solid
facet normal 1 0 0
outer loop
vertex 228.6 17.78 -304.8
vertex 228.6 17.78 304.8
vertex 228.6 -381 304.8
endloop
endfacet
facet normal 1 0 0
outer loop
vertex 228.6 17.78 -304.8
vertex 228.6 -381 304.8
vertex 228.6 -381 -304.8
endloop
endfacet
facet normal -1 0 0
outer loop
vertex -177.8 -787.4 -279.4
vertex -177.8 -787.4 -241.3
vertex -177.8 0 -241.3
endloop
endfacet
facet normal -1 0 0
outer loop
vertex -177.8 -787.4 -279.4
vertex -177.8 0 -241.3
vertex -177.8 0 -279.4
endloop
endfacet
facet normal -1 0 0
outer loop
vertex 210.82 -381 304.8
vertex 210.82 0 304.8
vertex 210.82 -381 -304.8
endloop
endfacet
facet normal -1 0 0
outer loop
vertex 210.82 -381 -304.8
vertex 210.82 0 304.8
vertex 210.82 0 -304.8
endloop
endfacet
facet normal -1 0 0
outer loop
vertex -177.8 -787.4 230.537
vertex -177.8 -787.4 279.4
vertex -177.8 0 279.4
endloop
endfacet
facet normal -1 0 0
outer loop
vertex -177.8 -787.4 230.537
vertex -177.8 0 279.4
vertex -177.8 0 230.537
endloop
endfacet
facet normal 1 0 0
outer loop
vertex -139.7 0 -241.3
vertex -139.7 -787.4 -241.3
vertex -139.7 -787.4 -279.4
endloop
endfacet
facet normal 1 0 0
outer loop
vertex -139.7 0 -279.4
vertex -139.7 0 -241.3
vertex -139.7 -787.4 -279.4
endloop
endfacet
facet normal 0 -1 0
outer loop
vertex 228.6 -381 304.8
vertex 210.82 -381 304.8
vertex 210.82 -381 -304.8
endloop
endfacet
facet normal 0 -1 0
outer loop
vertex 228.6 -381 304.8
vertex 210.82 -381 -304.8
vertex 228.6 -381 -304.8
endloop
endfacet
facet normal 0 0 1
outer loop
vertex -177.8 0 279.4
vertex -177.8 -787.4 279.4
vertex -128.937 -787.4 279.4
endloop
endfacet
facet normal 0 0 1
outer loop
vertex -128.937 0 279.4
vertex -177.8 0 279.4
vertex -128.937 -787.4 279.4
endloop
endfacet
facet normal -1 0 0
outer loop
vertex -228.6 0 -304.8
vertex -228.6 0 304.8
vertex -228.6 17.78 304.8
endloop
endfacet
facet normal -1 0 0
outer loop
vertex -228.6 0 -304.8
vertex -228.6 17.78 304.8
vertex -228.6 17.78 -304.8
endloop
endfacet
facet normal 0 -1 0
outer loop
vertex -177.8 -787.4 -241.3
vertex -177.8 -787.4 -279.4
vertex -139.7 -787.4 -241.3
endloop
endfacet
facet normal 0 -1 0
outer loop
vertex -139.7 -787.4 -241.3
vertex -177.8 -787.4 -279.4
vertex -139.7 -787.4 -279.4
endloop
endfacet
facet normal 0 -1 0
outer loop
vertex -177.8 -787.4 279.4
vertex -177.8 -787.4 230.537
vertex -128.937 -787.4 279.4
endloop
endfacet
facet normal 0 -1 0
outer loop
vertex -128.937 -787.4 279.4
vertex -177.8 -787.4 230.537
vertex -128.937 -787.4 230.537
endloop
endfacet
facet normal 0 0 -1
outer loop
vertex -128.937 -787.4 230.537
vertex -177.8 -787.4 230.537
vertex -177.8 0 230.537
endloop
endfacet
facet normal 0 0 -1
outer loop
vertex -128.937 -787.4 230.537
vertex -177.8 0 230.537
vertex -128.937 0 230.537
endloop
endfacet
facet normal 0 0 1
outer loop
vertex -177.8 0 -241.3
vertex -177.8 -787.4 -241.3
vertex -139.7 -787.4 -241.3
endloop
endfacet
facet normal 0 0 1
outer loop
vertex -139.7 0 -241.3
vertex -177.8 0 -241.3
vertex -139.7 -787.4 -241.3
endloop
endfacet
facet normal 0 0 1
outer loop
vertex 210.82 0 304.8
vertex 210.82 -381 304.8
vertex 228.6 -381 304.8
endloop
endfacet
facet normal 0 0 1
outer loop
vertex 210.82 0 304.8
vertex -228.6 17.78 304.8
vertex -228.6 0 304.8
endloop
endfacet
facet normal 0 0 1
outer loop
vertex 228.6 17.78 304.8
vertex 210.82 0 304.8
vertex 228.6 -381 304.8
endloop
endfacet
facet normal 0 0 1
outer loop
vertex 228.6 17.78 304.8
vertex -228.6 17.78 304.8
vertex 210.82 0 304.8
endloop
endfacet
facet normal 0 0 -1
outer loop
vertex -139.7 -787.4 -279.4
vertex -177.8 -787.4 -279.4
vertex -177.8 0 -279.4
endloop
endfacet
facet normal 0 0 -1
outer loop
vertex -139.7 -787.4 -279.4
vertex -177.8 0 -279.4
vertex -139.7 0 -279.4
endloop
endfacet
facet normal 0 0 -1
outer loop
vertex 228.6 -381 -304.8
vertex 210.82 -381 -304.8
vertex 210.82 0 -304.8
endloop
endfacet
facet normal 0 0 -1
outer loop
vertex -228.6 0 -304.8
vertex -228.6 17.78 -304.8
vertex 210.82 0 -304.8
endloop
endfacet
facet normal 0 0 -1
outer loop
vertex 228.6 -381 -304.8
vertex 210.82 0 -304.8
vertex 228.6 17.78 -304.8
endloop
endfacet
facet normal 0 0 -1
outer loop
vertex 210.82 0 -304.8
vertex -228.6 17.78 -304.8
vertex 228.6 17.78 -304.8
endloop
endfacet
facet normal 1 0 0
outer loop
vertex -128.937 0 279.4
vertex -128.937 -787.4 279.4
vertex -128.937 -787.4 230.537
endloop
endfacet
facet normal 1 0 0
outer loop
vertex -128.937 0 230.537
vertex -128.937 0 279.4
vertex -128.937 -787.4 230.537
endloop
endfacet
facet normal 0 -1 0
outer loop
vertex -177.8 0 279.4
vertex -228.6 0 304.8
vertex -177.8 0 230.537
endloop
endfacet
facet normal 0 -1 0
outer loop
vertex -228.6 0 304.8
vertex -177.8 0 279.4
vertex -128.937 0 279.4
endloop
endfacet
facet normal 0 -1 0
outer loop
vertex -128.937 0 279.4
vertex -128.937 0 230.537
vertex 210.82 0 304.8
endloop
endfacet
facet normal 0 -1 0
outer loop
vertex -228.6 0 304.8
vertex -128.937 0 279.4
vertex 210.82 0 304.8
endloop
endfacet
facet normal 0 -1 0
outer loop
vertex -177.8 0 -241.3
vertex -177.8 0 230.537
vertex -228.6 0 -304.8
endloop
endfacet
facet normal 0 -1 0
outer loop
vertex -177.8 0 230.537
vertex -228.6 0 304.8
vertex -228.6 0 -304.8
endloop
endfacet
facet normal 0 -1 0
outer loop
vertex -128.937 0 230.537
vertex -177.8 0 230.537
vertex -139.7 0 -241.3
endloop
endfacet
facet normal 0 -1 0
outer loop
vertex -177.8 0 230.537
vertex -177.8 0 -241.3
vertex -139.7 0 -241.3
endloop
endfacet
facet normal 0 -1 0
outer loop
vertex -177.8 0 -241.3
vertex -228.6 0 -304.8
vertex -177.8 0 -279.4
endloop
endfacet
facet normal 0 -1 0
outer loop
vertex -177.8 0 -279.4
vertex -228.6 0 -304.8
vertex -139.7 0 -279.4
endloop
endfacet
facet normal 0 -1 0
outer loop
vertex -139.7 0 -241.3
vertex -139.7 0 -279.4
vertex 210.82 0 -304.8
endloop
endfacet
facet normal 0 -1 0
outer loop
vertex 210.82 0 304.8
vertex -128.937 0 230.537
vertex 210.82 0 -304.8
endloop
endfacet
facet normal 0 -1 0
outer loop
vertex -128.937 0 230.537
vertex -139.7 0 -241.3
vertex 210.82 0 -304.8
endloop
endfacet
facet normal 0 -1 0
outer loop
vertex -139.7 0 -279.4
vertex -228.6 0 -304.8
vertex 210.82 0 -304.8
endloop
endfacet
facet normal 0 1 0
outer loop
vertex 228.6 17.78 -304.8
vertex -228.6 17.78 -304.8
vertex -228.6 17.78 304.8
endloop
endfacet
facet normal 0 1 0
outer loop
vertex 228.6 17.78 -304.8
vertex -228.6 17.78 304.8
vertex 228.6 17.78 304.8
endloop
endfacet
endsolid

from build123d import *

# Parameters (mm, degrees)
SKETCH2_W                = 457.2
SKETCH2_H                = 609.6
SKETCH2_W_2              = 38.1
SKETCH2_H_2              = 38.1
SKETCH2_W_3              = 48.862926818
SKETCH2_H_3              = 48.862926818
BOSS_EXTRUDE1_DEPTH      = 17.78
SKETCH3_W                = 17.78
SKETCH3_H                = 609.6
BOSS_EXTRUDE2_DEPTH      = 381
BOSS_EXTRUDE3_DEPTH      = 17.78
BOSS_EXTRUDE3_DEPTH_BACK = 787.4
SKETCH4_W                = 38.1
SKETCH4_H                = 38.1
SKETCH4_W_2              = 48.862926818
SKETCH4_H_2              = 48.862926818


with BuildPart() as part:
    # Sketch2 → Boss-Extrude1 (new body)
    with BuildSketch(Plane(origin=(0, 0, 0), x_dir=(1, 0, 0), z_dir=(0, 1, 0))):
        Rectangle(SKETCH2_W, SKETCH2_H)
        with Locations((-158.75, 260.35)):
            Rectangle(SKETCH2_W_2, SKETCH2_H_2, mode=Mode.SUBTRACT)
        with Locations((-153.368536591, -254.968536591)):
            Rectangle(SKETCH2_W_3, SKETCH2_H_3, mode=Mode.SUBTRACT)
    extrude(amount=BOSS_EXTRUDE1_DEPTH)

    # Sketch3 → Boss-Extrude2 (add)
    with BuildSketch(Plane(origin=(0, 0, 0), x_dir=(1, 0, 0), z_dir=(0, 1, 0))):
        with Locations((219.71, 0)):
            Rectangle(SKETCH3_W, SKETCH3_H)
    extrude(amount=-BOSS_EXTRUDE2_DEPTH)

    # Sketch4 → Boss-Extrude3 (add, two sides: drawn at the far end of the back side and taken through both)
    with BuildSketch(Plane(origin=(0, 0, 0), x_dir=(1, 0, 0), z_dir=(0, 1, 0)).offset(-BOSS_EXTRUDE3_DEPTH_BACK)):
        with Locations((-158.75, 260.35)):
            Rectangle(SKETCH4_W, SKETCH4_H)
        with Locations((-153.368536591, -254.968536591)):
            Rectangle(SKETCH4_W_2, SKETCH4_H_2)
    extrude(amount=BOSS_EXTRUDE3_DEPTH + BOSS_EXTRUDE3_DEPTH_BACK)


solid = part.part
